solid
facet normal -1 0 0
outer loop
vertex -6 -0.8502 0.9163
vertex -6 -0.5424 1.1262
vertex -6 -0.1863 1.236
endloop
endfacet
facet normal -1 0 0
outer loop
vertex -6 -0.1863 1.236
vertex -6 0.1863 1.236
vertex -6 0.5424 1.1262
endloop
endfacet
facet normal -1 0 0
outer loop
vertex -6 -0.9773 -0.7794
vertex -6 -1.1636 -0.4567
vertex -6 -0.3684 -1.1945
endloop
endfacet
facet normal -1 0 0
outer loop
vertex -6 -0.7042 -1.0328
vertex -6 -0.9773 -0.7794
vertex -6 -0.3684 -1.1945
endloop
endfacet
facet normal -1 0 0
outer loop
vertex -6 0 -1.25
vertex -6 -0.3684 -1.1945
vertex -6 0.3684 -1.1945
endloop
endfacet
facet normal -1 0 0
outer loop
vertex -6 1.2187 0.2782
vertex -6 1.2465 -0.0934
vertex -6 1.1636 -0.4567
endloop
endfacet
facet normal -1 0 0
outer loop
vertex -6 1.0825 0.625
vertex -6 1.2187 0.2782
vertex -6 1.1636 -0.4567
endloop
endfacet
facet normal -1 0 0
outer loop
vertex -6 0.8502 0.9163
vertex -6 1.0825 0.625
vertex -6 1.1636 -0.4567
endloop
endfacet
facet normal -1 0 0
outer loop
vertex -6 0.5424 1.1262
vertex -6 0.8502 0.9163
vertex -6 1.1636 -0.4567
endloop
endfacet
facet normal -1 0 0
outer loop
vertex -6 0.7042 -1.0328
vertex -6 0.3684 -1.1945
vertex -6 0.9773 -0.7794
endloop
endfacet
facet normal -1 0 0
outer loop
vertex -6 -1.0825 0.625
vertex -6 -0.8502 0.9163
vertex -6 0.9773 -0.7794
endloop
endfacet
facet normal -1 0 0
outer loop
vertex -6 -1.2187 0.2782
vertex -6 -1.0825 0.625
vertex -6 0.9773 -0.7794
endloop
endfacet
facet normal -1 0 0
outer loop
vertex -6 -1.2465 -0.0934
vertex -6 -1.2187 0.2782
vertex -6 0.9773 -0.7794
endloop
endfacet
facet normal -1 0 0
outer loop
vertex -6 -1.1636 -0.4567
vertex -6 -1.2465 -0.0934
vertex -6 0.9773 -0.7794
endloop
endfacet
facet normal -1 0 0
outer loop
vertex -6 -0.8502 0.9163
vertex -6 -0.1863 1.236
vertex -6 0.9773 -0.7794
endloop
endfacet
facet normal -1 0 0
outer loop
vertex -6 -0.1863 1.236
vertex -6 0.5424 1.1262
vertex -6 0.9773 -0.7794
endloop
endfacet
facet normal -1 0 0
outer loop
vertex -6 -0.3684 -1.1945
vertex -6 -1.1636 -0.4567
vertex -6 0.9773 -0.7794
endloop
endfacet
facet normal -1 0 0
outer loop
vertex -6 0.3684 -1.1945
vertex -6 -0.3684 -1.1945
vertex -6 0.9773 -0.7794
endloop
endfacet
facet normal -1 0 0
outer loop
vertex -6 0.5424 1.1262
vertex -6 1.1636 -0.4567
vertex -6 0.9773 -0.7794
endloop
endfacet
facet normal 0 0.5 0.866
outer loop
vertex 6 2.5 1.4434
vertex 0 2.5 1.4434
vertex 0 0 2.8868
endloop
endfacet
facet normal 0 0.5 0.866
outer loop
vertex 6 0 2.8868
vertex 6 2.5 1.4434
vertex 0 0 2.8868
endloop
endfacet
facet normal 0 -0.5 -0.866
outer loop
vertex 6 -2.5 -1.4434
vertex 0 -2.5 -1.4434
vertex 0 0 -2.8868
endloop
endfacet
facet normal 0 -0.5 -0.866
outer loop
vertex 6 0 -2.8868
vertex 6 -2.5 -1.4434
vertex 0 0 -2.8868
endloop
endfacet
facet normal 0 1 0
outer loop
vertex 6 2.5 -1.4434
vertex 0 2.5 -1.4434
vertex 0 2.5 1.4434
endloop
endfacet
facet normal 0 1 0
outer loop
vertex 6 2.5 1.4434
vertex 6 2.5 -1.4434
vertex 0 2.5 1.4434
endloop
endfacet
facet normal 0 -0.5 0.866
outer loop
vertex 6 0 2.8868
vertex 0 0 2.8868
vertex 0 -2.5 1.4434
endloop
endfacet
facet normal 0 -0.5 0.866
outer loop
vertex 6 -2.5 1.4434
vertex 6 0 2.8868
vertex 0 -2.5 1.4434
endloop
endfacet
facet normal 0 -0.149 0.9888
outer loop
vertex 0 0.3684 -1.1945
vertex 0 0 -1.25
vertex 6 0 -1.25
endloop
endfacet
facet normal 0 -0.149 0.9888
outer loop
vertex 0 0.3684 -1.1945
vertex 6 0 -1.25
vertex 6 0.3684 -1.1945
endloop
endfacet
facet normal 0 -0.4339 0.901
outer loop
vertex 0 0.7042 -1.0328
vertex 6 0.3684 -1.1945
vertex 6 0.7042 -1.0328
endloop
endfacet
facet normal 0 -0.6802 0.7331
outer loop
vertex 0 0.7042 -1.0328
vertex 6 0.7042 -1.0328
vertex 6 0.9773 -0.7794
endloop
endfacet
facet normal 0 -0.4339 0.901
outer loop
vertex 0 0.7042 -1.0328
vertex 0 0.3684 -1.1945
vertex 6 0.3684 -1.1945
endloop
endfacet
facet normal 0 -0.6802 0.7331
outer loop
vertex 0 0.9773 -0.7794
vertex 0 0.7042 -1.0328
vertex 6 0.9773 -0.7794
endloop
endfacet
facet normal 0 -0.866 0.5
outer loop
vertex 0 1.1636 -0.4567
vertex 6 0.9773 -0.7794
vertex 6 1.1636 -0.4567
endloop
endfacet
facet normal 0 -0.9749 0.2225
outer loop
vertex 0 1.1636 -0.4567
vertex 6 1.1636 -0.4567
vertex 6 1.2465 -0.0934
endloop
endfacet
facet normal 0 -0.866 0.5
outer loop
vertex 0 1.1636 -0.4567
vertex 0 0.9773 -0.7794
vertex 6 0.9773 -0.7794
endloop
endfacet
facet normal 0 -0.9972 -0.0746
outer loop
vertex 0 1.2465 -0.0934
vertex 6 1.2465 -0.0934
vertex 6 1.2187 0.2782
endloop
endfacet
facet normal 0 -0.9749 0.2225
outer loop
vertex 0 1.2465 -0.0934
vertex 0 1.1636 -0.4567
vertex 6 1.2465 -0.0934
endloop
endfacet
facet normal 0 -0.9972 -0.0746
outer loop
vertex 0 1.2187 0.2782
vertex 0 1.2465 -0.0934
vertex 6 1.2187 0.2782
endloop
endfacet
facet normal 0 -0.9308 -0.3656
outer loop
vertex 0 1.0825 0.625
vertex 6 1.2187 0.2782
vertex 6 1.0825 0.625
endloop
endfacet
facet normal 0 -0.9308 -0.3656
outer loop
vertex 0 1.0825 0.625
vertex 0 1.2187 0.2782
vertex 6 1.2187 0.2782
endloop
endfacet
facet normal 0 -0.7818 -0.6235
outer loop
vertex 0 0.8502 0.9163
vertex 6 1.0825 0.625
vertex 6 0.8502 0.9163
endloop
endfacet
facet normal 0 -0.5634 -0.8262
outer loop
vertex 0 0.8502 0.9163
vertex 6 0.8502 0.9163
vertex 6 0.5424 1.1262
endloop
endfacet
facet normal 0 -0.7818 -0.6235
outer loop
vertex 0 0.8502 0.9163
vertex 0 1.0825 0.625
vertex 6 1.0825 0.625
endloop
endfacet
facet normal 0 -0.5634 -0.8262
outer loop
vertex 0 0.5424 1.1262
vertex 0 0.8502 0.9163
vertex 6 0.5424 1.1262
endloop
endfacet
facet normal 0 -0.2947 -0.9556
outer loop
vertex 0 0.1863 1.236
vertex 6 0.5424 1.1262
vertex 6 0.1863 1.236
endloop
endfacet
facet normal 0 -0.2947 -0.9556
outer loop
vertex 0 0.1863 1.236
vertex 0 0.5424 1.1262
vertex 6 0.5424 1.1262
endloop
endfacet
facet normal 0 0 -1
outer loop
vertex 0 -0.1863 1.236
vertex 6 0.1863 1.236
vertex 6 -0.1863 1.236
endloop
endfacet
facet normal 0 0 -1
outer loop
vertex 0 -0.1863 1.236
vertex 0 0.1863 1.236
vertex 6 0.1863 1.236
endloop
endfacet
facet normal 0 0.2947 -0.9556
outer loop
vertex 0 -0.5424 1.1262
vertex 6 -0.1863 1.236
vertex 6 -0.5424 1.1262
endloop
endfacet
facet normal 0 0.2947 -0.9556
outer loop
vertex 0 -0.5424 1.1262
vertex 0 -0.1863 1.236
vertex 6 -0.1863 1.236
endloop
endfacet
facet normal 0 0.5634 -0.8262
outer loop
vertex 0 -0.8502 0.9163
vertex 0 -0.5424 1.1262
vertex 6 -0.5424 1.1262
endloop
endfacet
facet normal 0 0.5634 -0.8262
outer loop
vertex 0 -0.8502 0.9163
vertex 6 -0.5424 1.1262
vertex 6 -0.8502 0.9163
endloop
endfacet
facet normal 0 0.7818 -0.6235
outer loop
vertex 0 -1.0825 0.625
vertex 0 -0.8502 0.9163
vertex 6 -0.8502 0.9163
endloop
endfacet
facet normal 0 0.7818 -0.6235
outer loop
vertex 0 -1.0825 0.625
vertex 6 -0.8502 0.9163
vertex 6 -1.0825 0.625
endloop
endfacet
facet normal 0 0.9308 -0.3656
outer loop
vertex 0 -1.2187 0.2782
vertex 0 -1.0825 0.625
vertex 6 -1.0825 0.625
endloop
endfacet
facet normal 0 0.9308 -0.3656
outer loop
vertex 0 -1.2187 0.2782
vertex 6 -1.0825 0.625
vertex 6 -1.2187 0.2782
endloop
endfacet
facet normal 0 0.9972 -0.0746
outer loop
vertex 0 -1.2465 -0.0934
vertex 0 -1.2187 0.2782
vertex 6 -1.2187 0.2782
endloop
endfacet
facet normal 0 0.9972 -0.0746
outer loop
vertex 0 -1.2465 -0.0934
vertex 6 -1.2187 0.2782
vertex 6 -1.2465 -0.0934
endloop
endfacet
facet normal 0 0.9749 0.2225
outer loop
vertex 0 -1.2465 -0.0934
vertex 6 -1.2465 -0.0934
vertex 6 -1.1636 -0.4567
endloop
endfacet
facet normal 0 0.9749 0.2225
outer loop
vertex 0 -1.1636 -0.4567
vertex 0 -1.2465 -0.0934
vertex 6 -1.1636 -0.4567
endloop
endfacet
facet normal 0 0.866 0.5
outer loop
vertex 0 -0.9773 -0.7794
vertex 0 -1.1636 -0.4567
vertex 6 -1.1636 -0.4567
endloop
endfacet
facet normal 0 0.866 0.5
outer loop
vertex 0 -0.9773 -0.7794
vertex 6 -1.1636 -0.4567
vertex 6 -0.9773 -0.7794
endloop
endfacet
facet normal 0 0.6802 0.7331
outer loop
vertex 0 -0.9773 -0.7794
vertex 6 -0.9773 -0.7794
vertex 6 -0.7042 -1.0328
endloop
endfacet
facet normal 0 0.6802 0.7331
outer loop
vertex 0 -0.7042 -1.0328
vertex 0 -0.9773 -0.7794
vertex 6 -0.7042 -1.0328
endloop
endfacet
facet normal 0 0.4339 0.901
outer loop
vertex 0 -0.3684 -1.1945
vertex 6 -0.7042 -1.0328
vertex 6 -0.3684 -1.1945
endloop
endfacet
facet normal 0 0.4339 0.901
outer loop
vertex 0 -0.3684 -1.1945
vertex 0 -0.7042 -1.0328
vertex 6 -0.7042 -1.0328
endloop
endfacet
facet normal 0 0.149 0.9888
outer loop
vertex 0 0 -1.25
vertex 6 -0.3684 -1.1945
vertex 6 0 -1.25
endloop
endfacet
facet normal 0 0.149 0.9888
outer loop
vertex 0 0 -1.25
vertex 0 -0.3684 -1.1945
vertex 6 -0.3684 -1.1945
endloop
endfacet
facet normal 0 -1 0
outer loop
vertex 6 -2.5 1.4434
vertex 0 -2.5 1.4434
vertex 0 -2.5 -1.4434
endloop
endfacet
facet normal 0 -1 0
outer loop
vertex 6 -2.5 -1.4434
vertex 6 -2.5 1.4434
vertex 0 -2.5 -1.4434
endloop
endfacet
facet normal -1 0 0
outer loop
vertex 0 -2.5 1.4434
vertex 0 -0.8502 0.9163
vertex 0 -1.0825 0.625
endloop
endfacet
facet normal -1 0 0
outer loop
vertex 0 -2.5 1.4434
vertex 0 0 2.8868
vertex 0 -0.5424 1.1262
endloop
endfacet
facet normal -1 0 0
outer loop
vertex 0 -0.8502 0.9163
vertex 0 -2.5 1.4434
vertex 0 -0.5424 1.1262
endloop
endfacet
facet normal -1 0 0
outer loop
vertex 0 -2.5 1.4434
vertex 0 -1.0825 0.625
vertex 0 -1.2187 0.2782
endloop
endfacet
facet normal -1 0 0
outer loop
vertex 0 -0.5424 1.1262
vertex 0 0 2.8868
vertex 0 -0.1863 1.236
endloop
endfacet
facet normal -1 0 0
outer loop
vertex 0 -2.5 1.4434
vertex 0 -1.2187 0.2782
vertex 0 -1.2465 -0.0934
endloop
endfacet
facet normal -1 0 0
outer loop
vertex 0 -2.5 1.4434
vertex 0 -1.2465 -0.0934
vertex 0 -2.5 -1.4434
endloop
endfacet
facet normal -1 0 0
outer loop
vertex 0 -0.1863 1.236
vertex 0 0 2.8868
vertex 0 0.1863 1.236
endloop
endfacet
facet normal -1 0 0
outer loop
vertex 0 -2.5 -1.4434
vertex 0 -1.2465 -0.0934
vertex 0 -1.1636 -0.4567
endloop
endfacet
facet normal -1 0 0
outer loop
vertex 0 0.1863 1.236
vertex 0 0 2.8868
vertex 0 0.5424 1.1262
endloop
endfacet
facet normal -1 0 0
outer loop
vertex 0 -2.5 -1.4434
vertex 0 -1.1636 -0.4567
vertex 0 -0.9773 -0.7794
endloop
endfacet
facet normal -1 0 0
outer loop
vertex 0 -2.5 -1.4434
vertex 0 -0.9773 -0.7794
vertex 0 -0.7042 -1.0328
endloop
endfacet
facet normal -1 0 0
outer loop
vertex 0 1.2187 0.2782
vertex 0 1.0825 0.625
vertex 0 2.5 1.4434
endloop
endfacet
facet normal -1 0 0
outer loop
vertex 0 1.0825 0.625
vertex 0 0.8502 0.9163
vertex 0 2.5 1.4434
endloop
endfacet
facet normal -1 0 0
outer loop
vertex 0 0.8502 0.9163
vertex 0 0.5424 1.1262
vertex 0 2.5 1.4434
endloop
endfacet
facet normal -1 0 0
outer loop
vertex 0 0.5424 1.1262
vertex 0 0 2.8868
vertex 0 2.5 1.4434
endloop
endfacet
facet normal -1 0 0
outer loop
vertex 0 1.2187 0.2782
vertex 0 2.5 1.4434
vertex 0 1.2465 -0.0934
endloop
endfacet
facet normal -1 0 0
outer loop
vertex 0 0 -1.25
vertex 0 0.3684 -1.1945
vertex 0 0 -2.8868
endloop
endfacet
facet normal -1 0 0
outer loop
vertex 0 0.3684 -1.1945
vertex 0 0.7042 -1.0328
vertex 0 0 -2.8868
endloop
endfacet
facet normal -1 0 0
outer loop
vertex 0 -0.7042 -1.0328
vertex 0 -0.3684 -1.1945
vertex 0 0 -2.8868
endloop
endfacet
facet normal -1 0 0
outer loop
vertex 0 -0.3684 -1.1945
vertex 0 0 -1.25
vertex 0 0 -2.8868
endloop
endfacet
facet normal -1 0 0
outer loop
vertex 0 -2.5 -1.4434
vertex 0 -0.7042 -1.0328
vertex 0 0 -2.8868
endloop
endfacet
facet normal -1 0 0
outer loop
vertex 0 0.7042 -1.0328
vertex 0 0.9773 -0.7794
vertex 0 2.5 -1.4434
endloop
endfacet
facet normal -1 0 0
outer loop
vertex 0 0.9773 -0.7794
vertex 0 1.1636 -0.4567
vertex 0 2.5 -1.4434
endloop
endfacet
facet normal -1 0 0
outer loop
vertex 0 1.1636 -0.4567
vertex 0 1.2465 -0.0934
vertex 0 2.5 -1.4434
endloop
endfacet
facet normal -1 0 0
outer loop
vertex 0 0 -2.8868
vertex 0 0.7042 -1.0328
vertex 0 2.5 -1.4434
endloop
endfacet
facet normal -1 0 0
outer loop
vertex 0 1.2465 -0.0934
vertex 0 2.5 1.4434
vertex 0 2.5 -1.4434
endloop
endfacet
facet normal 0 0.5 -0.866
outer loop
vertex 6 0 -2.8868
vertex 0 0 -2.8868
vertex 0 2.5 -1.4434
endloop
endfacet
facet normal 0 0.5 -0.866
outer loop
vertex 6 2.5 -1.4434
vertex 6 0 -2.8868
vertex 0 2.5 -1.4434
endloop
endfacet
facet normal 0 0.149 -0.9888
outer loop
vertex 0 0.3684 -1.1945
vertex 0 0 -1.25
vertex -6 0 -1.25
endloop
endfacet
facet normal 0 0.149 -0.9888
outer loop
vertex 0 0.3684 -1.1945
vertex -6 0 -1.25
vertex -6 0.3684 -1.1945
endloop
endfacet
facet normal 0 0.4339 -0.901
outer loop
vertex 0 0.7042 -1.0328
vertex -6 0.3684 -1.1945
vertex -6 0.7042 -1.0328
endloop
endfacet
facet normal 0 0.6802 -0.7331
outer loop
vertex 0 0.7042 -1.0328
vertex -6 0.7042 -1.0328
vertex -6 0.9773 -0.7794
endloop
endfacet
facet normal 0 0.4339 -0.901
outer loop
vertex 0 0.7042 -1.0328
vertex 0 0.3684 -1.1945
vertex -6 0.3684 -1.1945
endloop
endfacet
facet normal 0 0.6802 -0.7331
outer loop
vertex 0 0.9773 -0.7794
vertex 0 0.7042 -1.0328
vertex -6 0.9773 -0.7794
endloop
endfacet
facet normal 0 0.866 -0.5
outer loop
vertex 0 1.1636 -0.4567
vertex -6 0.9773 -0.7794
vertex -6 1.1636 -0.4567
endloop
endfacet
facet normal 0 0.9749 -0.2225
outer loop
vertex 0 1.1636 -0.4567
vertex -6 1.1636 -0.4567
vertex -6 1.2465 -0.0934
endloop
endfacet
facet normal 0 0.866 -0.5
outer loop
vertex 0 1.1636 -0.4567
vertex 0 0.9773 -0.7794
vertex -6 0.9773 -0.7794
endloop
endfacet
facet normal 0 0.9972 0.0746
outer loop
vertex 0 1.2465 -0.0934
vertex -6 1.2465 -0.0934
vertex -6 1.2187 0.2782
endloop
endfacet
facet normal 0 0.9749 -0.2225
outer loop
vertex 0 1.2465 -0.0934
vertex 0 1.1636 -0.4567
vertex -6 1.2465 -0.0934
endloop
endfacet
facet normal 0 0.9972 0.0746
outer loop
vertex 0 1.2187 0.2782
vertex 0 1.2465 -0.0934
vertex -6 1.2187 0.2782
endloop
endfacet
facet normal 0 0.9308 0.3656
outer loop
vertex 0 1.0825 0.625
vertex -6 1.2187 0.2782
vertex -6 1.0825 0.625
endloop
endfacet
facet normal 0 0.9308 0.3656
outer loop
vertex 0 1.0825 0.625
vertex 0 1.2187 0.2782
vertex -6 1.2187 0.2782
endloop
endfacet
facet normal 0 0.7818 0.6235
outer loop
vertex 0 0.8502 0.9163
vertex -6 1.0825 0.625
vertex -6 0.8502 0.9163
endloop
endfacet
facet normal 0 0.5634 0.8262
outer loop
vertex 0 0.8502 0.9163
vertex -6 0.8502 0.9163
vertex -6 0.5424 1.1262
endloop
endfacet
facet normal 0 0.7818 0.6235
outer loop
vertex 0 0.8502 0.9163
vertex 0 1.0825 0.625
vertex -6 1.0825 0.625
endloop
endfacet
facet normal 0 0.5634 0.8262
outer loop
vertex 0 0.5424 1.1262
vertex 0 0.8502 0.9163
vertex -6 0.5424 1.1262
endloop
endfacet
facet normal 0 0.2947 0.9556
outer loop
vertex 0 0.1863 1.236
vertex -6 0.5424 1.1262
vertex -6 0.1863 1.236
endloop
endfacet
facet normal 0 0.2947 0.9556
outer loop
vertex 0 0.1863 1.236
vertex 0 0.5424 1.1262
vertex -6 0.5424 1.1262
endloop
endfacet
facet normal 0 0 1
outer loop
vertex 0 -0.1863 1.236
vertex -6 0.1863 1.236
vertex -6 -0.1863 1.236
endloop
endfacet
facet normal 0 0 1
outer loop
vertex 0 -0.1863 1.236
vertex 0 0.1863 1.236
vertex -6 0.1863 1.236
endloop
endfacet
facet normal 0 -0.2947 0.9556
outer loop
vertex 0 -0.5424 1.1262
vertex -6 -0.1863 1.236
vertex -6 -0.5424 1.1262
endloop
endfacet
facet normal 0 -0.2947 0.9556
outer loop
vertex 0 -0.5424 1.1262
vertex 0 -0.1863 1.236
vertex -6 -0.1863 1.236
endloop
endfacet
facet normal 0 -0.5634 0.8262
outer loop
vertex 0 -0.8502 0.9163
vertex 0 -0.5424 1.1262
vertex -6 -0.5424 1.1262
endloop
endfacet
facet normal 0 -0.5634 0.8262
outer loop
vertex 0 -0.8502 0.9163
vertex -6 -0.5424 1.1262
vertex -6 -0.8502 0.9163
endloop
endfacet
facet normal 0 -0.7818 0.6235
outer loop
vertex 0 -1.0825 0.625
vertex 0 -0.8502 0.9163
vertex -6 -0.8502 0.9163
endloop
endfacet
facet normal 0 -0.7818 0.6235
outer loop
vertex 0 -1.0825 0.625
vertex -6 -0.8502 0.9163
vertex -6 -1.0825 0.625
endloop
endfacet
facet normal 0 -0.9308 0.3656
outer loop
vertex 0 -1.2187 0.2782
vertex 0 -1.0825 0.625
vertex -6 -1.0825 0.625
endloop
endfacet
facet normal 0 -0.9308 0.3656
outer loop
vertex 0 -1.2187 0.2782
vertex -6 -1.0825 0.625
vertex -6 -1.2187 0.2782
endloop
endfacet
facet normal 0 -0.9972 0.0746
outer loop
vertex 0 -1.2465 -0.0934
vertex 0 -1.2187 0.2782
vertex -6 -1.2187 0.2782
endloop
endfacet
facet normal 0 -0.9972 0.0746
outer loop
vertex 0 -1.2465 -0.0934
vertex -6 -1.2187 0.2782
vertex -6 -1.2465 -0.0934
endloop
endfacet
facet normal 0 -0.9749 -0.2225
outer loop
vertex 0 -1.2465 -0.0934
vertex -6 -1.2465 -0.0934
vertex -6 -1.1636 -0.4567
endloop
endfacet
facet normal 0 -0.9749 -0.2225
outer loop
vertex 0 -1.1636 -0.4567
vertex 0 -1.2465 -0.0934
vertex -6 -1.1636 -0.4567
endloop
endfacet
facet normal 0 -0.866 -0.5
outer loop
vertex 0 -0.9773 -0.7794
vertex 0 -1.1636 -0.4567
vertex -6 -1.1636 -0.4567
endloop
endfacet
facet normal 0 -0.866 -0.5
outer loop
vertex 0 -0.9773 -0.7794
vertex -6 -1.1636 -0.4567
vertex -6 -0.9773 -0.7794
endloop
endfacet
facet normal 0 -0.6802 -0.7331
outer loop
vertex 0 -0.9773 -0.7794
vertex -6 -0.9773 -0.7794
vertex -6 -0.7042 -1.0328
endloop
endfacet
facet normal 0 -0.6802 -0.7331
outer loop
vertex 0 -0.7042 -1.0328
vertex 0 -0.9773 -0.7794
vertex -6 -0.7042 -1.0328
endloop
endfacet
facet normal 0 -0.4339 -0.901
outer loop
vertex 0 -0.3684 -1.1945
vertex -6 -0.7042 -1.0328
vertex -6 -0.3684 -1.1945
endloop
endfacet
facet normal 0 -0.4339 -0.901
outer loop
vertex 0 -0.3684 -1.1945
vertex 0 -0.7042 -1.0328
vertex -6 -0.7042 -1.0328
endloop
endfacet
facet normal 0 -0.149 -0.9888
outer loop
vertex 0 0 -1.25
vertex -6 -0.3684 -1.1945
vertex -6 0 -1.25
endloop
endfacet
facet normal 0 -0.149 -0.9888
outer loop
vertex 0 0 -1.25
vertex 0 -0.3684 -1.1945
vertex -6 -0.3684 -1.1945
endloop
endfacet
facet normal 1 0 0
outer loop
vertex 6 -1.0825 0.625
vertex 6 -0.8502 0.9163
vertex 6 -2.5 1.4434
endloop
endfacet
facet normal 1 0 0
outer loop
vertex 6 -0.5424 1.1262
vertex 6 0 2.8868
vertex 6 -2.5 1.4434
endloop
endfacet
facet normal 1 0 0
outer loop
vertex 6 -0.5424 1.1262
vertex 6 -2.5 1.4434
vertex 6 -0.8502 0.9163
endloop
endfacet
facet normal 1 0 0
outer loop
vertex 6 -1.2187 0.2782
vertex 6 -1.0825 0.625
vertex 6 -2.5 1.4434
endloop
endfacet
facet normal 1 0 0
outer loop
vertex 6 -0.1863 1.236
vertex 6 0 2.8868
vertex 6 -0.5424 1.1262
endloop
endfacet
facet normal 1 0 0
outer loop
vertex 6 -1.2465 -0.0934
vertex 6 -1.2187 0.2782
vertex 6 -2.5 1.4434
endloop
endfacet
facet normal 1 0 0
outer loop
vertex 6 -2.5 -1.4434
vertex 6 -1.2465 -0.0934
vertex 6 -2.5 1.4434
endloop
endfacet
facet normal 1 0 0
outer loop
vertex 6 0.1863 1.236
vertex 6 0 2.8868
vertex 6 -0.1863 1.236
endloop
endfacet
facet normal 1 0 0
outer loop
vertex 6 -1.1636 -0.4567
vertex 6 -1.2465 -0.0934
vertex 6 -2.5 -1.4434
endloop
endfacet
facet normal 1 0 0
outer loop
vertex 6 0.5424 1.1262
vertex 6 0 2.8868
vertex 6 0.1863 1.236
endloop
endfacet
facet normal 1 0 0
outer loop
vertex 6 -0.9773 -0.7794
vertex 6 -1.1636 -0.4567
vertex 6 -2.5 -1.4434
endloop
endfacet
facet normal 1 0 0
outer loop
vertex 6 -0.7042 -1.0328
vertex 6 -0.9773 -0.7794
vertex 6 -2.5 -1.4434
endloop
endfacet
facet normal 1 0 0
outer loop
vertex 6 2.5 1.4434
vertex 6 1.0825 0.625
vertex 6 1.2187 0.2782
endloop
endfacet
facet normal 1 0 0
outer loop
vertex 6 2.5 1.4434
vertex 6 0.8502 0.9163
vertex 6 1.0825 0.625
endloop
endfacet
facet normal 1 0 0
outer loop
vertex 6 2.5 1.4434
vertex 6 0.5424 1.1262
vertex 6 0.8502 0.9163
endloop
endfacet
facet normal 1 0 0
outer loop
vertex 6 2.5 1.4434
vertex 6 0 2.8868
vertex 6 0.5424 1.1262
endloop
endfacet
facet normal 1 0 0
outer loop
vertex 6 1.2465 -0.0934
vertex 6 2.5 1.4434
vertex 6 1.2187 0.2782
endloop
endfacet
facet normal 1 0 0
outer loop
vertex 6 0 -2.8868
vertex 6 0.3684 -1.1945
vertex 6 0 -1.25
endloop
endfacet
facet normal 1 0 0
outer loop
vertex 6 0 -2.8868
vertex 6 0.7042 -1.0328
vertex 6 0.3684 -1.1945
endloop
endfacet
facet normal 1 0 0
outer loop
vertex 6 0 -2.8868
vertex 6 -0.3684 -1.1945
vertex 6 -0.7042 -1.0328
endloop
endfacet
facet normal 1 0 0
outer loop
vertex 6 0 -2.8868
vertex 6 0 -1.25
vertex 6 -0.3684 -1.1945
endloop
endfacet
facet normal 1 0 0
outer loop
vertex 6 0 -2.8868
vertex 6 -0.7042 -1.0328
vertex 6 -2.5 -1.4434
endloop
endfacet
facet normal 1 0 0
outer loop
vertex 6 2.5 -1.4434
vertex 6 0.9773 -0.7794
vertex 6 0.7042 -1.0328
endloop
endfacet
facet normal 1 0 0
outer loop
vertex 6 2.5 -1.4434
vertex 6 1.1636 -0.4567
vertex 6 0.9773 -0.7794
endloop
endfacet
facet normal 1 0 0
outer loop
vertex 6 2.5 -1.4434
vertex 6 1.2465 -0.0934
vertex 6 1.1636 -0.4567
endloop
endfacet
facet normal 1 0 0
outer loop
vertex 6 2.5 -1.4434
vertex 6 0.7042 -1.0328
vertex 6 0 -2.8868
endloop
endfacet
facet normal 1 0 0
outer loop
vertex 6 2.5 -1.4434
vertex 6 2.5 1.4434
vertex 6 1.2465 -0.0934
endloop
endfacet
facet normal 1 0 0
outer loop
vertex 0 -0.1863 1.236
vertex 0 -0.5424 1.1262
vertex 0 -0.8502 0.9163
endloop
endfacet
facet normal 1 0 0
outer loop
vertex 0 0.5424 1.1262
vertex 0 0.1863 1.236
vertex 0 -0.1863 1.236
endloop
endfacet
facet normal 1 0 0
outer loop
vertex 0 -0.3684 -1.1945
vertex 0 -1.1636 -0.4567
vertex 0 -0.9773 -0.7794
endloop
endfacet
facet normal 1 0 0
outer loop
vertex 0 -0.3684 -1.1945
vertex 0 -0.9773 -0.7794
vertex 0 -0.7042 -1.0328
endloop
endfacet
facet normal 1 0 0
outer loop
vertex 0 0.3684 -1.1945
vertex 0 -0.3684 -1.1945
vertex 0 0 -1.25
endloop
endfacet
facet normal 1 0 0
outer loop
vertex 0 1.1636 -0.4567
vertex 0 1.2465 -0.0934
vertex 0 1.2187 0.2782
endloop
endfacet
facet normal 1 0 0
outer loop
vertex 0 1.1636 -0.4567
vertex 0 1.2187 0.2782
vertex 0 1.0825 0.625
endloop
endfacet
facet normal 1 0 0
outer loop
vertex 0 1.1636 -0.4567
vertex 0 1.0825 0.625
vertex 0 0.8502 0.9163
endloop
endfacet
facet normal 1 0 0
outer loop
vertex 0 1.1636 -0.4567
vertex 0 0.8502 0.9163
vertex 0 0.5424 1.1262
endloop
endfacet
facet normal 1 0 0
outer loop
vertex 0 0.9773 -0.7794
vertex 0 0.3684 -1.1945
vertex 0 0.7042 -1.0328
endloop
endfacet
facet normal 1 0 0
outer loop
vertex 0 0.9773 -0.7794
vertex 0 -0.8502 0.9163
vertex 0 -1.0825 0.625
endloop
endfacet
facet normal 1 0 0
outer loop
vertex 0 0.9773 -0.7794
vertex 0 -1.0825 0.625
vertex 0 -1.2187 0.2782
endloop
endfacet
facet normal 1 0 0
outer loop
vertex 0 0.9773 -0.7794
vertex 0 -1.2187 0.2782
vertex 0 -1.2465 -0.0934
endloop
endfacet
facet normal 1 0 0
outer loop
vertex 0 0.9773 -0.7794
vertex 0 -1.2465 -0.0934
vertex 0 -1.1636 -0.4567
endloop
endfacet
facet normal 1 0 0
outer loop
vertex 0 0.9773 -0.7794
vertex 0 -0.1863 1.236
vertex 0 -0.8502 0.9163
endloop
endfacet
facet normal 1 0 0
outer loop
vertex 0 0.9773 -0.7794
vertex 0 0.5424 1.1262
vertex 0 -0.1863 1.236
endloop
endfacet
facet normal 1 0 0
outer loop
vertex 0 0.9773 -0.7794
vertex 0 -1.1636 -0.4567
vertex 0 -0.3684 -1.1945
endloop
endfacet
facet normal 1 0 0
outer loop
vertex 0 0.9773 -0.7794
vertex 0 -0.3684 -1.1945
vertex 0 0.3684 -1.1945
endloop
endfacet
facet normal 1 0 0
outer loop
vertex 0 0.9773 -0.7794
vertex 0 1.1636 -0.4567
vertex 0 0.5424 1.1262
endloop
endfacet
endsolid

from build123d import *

# Parameters (mm, degrees)
SKETCH1_R           = 1.25
BOSS_EXTRUDE1_DEPTH = 6
SKETCH2_R           = 1.25
BOSS_EXTRUDE2_DEPTH = 6


with BuildPart() as part:
    # Sketch1 → Boss-Extrude1 (new body)
    with BuildSketch(Plane(origin=(0, 0, 0), x_dir=(0, 0, -1), z_dir=(1, 0, 0))):
        Circle(SKETCH1_R)
    extrude(amount=-BOSS_EXTRUDE1_DEPTH)


with BuildPart() as body_2:
    # Sketch2 → Boss-Extrude2 (new body)
    with BuildSketch(Plane(origin=(0, 0, 0), x_dir=(0, 0, -1), z_dir=(1, 0, 0))):
        Polygon((2.886751346, 0), (1.443375673, 2.5), (-1.443375673, 2.5), (-2.886751346, 0), (-1.443375673, -2.5), (1.443375673, -2.5), align=None)
        Circle(SKETCH2_R, mode=Mode.SUBTRACT)
    extrude(amount=BOSS_EXTRUDE2_DEPTH)


solid = Compound([part.part, body_2.part])
